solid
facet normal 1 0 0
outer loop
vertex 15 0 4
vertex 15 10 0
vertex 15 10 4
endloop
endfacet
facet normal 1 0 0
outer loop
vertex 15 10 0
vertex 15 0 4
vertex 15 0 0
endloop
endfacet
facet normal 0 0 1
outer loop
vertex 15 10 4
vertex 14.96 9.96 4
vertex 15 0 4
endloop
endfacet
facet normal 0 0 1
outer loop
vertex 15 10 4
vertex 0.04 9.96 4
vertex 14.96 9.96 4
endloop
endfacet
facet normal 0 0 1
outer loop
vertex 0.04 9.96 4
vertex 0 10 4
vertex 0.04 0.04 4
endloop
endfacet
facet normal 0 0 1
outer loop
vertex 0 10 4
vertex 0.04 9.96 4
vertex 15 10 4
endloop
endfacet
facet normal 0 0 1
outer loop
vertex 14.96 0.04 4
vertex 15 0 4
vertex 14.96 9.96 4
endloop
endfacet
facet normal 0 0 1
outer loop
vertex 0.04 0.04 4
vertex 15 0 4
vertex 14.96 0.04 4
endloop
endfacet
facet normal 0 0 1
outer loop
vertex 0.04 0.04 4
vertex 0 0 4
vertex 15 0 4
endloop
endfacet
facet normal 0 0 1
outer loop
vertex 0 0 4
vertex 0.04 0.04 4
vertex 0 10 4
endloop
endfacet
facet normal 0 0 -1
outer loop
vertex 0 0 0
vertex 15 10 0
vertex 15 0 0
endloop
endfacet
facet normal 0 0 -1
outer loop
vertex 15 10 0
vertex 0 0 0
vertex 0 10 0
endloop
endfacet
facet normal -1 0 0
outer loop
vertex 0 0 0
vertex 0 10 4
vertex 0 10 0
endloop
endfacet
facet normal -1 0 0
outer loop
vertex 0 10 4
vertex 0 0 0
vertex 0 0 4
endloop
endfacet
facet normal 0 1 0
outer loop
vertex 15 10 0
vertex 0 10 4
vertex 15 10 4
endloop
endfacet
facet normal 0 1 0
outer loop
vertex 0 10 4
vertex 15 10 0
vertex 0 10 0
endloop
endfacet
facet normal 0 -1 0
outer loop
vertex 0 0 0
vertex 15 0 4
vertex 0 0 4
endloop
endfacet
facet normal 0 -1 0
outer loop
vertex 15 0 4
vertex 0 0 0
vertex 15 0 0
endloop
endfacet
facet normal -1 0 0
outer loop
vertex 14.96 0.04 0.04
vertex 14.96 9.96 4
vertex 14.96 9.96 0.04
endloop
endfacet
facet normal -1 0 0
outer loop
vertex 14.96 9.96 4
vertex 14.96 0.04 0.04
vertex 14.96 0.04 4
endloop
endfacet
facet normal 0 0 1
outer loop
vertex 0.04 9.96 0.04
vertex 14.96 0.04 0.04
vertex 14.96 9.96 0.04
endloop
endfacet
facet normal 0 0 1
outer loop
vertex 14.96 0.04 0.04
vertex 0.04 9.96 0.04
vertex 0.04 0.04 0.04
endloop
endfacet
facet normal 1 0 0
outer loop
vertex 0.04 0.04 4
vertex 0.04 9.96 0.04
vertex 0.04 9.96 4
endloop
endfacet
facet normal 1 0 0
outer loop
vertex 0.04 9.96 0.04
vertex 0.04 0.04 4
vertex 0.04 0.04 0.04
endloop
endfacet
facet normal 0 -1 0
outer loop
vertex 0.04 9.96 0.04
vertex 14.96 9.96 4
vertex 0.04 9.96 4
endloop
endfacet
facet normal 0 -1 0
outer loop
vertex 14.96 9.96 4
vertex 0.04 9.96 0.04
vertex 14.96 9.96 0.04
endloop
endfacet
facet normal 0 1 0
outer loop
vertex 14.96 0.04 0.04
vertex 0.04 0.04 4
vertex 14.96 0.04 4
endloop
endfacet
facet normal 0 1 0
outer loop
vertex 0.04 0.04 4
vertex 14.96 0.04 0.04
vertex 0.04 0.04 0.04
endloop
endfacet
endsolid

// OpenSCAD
outerDimensions = [15, 10, 4];
wallThickness = 0.04;
materialColor = [0.2, 0.3, 0.3];

difference() {
    color(materialColor) cube(outerDimensions);
    w = 2*wallThickness;
    translate([wallThickness, wallThickness, wallThickness]) {
        color(materialColor) cube([outerDimensions [0]- w, outerDimensions[1] - w, outerDimensions[2]]);
    }
}
